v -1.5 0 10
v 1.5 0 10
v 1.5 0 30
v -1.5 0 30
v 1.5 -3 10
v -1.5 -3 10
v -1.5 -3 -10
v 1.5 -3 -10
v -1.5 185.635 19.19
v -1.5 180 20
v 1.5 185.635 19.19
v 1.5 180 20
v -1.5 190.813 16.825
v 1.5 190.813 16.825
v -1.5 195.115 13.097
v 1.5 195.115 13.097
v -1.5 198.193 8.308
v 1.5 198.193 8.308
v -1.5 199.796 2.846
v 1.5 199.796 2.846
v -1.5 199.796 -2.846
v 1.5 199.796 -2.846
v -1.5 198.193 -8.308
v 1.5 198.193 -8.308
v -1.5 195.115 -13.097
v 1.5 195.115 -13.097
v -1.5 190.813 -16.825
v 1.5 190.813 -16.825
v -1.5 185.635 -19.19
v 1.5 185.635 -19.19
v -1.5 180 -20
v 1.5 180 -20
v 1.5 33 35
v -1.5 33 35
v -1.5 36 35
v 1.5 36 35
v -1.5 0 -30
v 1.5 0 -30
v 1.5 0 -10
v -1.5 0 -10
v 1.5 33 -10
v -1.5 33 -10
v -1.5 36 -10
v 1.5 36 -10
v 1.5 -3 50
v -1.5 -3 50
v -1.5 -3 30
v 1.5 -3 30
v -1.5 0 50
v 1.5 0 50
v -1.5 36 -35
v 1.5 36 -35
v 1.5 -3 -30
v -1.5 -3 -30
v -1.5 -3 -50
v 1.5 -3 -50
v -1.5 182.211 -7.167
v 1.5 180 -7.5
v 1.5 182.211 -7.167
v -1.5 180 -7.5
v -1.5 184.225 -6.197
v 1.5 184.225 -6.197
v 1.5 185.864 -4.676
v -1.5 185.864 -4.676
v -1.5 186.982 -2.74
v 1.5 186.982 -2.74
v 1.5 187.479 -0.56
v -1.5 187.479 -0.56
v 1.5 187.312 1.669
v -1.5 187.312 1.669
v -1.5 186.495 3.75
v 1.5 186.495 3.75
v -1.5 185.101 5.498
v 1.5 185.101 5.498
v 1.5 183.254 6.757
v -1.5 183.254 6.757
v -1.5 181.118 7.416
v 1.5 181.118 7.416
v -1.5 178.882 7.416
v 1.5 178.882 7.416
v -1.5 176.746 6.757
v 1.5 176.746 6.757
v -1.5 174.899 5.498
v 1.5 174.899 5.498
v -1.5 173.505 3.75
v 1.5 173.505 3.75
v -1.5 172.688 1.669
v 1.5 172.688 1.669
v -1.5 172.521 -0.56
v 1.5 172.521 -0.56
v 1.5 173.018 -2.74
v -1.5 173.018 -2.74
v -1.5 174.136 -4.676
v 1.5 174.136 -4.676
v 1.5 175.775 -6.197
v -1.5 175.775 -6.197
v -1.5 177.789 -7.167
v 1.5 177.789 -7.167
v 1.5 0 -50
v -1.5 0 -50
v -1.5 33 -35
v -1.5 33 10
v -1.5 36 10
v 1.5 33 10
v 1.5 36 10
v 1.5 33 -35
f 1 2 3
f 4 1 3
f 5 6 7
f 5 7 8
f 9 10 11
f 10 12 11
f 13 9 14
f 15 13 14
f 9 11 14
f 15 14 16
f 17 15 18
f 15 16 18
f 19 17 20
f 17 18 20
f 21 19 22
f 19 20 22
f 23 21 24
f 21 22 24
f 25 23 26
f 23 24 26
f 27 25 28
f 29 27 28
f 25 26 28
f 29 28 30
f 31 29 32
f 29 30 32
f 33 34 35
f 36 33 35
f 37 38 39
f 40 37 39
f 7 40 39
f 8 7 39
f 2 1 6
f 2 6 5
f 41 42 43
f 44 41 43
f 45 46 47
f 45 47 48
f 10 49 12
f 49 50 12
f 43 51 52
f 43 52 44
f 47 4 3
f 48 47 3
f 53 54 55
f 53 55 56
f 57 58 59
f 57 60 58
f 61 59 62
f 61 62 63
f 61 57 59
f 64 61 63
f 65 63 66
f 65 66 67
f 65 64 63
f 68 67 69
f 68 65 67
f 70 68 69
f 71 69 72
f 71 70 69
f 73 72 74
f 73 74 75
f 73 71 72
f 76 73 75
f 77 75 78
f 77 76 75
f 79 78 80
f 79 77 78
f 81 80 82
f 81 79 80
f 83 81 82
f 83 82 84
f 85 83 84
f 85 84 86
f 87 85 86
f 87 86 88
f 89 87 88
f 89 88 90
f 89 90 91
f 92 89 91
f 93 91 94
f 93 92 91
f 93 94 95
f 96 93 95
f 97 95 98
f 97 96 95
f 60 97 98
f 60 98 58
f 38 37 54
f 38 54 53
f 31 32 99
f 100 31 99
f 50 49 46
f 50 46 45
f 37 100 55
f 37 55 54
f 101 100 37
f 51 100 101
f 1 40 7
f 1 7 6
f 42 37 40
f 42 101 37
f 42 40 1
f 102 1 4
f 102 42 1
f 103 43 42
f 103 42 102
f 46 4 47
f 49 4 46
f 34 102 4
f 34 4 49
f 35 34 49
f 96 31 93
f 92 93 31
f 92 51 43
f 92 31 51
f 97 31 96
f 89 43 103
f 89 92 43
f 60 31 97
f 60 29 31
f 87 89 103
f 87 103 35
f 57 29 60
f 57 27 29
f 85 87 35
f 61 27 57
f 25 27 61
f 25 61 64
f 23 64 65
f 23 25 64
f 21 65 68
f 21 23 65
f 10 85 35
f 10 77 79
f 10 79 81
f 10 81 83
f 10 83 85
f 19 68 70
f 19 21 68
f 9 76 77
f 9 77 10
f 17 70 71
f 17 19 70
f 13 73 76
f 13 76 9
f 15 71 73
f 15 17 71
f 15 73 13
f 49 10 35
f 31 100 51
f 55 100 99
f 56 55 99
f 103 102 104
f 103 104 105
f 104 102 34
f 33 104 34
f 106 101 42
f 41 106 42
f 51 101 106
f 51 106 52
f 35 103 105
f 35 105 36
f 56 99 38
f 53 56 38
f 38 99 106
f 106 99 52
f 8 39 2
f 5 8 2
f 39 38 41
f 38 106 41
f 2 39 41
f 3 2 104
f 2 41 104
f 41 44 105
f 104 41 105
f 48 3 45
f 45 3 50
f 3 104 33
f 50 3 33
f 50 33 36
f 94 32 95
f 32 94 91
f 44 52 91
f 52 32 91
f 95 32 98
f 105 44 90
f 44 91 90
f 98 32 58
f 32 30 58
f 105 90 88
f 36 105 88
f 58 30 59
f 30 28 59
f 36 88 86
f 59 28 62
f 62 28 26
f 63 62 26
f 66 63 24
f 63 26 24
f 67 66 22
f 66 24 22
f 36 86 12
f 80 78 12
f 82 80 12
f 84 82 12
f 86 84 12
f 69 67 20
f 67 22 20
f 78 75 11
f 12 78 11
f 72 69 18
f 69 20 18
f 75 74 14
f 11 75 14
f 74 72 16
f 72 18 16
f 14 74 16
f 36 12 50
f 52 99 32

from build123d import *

# Parameters (mm, degrees)
SKETCH2_R           = 7.5
BOSS_EXTRUDE1_DEPTH = 1.5
SKETCH3_W           = 25
SKETCH3_H           = 3
CUT_EXTRUDE1_DEPTH  = 4
SKETCH4_W           = 3
SKETCH4_H           = 20
BOSS_EXTRUDE2_DEPTH = 3


with BuildPart() as part:
    # Sketch2 → Boss-Extrude1 (new, symmetric)
    with BuildSketch(Plane(origin=(0, 0, 0), x_dir=(0, 0, -1), z_dir=(1, 0, 0))):
        with BuildLine():
            Line((50, 0), (-50, 0))
            Line((-50, 0), (-20, 180))
            ThreePointArc((-20, 180), (0, 200), (20, 180))
            Line((20, 180), (50, 0))
        make_face()
        with Locations((0, 180)):
            Circle(SKETCH2_R, mode=Mode.SUBTRACT)
    extrude(amount=BOSS_EXTRUDE1_DEPTH, both=True)

    # Sketch3 → Cut-Extrude1 (cut)
    with BuildSketch(Plane.ZY.offset(1.5)):
        with Locations((22.5, 34.5)):
            Rectangle(SKETCH3_W, SKETCH3_H)
        with Locations((-22.5, 34.5)):
            Rectangle(SKETCH3_W, SKETCH3_H)
    extrude(amount=-CUT_EXTRUDE1_DEPTH, mode=Mode.SUBTRACT)

    # Sketch4 → Boss-Extrude2 (add)
    with BuildSketch(Plane.XZ):
        Rectangle(SKETCH4_W, SKETCH4_H)
        with Locations((0, -40)):
            Rectangle(SKETCH4_W, SKETCH4_H)
        with Locations((0, 40)):
            Rectangle(SKETCH4_W, SKETCH4_H)
    extrude(amount=BOSS_EXTRUDE2_DEPTH)


solid = part.part
